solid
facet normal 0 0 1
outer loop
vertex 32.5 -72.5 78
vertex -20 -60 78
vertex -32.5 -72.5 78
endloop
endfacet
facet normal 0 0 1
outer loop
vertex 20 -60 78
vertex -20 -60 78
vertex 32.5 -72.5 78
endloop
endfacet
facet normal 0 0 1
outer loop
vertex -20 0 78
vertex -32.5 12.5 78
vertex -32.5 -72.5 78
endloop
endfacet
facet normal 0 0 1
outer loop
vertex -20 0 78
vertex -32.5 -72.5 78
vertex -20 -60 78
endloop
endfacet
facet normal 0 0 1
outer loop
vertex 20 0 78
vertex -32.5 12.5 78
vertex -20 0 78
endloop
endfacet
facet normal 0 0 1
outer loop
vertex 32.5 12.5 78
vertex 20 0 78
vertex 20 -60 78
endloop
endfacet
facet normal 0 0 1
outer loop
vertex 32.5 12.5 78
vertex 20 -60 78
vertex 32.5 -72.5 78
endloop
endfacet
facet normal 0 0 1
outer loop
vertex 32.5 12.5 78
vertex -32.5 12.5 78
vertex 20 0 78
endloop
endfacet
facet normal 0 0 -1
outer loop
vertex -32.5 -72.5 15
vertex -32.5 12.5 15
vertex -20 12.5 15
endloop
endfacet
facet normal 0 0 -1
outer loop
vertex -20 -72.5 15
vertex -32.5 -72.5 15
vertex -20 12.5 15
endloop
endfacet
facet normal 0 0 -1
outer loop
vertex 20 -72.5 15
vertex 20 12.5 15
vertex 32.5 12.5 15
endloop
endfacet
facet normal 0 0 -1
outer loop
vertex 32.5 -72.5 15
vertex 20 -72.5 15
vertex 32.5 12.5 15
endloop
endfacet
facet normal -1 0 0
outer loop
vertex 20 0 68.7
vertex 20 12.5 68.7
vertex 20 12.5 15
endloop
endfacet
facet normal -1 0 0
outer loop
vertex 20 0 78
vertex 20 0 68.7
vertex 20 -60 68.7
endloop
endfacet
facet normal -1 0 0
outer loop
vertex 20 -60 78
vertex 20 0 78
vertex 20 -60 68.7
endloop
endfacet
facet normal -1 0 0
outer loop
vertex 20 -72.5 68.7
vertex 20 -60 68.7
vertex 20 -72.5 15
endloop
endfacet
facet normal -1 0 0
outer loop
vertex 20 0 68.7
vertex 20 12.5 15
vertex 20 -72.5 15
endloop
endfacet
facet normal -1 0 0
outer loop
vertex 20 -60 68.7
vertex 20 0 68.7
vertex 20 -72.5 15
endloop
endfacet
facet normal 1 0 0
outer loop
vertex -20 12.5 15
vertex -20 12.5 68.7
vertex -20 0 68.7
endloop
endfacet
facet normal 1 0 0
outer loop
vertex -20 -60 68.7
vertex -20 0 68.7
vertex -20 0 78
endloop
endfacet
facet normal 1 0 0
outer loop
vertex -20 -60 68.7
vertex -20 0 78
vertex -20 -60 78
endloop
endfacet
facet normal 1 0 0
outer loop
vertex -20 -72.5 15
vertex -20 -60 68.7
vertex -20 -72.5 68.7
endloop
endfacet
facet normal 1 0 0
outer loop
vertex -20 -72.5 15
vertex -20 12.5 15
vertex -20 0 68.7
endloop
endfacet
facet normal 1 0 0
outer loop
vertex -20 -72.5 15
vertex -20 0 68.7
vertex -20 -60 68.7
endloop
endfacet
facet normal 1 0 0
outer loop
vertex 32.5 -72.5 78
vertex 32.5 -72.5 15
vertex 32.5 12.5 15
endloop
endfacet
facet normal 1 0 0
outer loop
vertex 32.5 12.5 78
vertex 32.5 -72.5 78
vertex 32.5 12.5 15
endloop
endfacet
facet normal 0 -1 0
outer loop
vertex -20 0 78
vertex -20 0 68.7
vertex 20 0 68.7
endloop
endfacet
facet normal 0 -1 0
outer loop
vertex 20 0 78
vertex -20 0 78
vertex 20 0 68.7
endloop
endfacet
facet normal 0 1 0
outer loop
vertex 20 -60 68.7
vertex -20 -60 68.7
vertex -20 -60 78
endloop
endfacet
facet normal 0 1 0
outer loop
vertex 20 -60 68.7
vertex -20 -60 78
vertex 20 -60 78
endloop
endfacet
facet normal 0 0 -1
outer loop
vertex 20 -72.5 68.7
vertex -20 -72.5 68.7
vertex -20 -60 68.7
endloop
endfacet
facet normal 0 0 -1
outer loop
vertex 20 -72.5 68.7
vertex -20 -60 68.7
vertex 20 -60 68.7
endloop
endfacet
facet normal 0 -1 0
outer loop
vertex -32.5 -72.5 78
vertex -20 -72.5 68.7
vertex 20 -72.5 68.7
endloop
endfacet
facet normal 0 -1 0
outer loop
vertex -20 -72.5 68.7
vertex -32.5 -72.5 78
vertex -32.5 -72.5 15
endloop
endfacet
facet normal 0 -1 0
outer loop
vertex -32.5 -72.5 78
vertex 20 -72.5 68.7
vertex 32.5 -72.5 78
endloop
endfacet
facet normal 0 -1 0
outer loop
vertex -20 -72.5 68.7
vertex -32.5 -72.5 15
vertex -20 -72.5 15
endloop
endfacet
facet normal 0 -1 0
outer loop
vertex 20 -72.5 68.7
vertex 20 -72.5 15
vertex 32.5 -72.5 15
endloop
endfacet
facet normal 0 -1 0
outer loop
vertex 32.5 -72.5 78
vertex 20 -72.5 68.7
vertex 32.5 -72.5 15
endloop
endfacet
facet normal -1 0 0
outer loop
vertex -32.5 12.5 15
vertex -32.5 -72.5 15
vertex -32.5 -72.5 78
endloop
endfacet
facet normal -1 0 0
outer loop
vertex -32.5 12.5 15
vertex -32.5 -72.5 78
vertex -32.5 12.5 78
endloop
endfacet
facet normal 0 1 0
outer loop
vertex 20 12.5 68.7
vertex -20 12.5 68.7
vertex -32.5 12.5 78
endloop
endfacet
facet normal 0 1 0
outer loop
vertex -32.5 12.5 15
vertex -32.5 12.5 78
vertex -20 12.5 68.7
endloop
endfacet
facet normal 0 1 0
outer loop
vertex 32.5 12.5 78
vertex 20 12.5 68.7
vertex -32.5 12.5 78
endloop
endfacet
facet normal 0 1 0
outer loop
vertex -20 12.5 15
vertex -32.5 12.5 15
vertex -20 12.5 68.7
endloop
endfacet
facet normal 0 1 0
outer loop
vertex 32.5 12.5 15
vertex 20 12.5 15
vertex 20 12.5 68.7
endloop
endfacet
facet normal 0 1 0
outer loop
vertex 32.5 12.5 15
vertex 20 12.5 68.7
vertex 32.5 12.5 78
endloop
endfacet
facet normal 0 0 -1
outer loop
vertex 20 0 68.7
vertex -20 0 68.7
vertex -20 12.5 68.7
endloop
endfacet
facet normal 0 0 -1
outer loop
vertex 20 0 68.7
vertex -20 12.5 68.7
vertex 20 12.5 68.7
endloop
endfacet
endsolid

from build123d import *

# Parameters (mm, degrees)
SKETCH021_W     = 65
SKETCH021_H     = 85
PAD015_DEPTH    = 63
SKETCH022_W     = 40
SKETCH022_H     = 85
POCKET009_DEPTH = 53.7
SKETCH024_W     = 40
SKETCH024_H     = 60
POCKET010_DEPTH = 63


with BuildPart() as part:
    # Sketch021 → Pad015 (new body)
    with BuildSketch(Plane.XY):
        with Locations((0, -30)):
            Rectangle(SKETCH021_W, SKETCH021_H)
    extrude(amount=PAD015_DEPTH)

    # Sketch022 (on Face5 of Pad015) → Pocket009 (cut)
    with BuildSketch(Plane(origin=(0, 0, 0), x_dir=(1, 0, 0), z_dir=(0, 0, -1))):
        with Locations((0, 30)):
            Rectangle(SKETCH022_W, SKETCH022_H)
    extrude(amount=-POCKET009_DEPTH, mode=Mode.SUBTRACT)

    # Sketch024 → Pocket010 (cut)
    with BuildSketch(Plane.XY):
        with Locations((0, -30)):
            Rectangle(SKETCH024_W, SKETCH024_H)
    extrude(amount=POCKET010_DEPTH, mode=Mode.SUBTRACT)


with BuildPart() as part_1:
    # Body003 placement: moved
    add(part.part.moved(Location((0, 0, 15))))


solid = part_1.part
